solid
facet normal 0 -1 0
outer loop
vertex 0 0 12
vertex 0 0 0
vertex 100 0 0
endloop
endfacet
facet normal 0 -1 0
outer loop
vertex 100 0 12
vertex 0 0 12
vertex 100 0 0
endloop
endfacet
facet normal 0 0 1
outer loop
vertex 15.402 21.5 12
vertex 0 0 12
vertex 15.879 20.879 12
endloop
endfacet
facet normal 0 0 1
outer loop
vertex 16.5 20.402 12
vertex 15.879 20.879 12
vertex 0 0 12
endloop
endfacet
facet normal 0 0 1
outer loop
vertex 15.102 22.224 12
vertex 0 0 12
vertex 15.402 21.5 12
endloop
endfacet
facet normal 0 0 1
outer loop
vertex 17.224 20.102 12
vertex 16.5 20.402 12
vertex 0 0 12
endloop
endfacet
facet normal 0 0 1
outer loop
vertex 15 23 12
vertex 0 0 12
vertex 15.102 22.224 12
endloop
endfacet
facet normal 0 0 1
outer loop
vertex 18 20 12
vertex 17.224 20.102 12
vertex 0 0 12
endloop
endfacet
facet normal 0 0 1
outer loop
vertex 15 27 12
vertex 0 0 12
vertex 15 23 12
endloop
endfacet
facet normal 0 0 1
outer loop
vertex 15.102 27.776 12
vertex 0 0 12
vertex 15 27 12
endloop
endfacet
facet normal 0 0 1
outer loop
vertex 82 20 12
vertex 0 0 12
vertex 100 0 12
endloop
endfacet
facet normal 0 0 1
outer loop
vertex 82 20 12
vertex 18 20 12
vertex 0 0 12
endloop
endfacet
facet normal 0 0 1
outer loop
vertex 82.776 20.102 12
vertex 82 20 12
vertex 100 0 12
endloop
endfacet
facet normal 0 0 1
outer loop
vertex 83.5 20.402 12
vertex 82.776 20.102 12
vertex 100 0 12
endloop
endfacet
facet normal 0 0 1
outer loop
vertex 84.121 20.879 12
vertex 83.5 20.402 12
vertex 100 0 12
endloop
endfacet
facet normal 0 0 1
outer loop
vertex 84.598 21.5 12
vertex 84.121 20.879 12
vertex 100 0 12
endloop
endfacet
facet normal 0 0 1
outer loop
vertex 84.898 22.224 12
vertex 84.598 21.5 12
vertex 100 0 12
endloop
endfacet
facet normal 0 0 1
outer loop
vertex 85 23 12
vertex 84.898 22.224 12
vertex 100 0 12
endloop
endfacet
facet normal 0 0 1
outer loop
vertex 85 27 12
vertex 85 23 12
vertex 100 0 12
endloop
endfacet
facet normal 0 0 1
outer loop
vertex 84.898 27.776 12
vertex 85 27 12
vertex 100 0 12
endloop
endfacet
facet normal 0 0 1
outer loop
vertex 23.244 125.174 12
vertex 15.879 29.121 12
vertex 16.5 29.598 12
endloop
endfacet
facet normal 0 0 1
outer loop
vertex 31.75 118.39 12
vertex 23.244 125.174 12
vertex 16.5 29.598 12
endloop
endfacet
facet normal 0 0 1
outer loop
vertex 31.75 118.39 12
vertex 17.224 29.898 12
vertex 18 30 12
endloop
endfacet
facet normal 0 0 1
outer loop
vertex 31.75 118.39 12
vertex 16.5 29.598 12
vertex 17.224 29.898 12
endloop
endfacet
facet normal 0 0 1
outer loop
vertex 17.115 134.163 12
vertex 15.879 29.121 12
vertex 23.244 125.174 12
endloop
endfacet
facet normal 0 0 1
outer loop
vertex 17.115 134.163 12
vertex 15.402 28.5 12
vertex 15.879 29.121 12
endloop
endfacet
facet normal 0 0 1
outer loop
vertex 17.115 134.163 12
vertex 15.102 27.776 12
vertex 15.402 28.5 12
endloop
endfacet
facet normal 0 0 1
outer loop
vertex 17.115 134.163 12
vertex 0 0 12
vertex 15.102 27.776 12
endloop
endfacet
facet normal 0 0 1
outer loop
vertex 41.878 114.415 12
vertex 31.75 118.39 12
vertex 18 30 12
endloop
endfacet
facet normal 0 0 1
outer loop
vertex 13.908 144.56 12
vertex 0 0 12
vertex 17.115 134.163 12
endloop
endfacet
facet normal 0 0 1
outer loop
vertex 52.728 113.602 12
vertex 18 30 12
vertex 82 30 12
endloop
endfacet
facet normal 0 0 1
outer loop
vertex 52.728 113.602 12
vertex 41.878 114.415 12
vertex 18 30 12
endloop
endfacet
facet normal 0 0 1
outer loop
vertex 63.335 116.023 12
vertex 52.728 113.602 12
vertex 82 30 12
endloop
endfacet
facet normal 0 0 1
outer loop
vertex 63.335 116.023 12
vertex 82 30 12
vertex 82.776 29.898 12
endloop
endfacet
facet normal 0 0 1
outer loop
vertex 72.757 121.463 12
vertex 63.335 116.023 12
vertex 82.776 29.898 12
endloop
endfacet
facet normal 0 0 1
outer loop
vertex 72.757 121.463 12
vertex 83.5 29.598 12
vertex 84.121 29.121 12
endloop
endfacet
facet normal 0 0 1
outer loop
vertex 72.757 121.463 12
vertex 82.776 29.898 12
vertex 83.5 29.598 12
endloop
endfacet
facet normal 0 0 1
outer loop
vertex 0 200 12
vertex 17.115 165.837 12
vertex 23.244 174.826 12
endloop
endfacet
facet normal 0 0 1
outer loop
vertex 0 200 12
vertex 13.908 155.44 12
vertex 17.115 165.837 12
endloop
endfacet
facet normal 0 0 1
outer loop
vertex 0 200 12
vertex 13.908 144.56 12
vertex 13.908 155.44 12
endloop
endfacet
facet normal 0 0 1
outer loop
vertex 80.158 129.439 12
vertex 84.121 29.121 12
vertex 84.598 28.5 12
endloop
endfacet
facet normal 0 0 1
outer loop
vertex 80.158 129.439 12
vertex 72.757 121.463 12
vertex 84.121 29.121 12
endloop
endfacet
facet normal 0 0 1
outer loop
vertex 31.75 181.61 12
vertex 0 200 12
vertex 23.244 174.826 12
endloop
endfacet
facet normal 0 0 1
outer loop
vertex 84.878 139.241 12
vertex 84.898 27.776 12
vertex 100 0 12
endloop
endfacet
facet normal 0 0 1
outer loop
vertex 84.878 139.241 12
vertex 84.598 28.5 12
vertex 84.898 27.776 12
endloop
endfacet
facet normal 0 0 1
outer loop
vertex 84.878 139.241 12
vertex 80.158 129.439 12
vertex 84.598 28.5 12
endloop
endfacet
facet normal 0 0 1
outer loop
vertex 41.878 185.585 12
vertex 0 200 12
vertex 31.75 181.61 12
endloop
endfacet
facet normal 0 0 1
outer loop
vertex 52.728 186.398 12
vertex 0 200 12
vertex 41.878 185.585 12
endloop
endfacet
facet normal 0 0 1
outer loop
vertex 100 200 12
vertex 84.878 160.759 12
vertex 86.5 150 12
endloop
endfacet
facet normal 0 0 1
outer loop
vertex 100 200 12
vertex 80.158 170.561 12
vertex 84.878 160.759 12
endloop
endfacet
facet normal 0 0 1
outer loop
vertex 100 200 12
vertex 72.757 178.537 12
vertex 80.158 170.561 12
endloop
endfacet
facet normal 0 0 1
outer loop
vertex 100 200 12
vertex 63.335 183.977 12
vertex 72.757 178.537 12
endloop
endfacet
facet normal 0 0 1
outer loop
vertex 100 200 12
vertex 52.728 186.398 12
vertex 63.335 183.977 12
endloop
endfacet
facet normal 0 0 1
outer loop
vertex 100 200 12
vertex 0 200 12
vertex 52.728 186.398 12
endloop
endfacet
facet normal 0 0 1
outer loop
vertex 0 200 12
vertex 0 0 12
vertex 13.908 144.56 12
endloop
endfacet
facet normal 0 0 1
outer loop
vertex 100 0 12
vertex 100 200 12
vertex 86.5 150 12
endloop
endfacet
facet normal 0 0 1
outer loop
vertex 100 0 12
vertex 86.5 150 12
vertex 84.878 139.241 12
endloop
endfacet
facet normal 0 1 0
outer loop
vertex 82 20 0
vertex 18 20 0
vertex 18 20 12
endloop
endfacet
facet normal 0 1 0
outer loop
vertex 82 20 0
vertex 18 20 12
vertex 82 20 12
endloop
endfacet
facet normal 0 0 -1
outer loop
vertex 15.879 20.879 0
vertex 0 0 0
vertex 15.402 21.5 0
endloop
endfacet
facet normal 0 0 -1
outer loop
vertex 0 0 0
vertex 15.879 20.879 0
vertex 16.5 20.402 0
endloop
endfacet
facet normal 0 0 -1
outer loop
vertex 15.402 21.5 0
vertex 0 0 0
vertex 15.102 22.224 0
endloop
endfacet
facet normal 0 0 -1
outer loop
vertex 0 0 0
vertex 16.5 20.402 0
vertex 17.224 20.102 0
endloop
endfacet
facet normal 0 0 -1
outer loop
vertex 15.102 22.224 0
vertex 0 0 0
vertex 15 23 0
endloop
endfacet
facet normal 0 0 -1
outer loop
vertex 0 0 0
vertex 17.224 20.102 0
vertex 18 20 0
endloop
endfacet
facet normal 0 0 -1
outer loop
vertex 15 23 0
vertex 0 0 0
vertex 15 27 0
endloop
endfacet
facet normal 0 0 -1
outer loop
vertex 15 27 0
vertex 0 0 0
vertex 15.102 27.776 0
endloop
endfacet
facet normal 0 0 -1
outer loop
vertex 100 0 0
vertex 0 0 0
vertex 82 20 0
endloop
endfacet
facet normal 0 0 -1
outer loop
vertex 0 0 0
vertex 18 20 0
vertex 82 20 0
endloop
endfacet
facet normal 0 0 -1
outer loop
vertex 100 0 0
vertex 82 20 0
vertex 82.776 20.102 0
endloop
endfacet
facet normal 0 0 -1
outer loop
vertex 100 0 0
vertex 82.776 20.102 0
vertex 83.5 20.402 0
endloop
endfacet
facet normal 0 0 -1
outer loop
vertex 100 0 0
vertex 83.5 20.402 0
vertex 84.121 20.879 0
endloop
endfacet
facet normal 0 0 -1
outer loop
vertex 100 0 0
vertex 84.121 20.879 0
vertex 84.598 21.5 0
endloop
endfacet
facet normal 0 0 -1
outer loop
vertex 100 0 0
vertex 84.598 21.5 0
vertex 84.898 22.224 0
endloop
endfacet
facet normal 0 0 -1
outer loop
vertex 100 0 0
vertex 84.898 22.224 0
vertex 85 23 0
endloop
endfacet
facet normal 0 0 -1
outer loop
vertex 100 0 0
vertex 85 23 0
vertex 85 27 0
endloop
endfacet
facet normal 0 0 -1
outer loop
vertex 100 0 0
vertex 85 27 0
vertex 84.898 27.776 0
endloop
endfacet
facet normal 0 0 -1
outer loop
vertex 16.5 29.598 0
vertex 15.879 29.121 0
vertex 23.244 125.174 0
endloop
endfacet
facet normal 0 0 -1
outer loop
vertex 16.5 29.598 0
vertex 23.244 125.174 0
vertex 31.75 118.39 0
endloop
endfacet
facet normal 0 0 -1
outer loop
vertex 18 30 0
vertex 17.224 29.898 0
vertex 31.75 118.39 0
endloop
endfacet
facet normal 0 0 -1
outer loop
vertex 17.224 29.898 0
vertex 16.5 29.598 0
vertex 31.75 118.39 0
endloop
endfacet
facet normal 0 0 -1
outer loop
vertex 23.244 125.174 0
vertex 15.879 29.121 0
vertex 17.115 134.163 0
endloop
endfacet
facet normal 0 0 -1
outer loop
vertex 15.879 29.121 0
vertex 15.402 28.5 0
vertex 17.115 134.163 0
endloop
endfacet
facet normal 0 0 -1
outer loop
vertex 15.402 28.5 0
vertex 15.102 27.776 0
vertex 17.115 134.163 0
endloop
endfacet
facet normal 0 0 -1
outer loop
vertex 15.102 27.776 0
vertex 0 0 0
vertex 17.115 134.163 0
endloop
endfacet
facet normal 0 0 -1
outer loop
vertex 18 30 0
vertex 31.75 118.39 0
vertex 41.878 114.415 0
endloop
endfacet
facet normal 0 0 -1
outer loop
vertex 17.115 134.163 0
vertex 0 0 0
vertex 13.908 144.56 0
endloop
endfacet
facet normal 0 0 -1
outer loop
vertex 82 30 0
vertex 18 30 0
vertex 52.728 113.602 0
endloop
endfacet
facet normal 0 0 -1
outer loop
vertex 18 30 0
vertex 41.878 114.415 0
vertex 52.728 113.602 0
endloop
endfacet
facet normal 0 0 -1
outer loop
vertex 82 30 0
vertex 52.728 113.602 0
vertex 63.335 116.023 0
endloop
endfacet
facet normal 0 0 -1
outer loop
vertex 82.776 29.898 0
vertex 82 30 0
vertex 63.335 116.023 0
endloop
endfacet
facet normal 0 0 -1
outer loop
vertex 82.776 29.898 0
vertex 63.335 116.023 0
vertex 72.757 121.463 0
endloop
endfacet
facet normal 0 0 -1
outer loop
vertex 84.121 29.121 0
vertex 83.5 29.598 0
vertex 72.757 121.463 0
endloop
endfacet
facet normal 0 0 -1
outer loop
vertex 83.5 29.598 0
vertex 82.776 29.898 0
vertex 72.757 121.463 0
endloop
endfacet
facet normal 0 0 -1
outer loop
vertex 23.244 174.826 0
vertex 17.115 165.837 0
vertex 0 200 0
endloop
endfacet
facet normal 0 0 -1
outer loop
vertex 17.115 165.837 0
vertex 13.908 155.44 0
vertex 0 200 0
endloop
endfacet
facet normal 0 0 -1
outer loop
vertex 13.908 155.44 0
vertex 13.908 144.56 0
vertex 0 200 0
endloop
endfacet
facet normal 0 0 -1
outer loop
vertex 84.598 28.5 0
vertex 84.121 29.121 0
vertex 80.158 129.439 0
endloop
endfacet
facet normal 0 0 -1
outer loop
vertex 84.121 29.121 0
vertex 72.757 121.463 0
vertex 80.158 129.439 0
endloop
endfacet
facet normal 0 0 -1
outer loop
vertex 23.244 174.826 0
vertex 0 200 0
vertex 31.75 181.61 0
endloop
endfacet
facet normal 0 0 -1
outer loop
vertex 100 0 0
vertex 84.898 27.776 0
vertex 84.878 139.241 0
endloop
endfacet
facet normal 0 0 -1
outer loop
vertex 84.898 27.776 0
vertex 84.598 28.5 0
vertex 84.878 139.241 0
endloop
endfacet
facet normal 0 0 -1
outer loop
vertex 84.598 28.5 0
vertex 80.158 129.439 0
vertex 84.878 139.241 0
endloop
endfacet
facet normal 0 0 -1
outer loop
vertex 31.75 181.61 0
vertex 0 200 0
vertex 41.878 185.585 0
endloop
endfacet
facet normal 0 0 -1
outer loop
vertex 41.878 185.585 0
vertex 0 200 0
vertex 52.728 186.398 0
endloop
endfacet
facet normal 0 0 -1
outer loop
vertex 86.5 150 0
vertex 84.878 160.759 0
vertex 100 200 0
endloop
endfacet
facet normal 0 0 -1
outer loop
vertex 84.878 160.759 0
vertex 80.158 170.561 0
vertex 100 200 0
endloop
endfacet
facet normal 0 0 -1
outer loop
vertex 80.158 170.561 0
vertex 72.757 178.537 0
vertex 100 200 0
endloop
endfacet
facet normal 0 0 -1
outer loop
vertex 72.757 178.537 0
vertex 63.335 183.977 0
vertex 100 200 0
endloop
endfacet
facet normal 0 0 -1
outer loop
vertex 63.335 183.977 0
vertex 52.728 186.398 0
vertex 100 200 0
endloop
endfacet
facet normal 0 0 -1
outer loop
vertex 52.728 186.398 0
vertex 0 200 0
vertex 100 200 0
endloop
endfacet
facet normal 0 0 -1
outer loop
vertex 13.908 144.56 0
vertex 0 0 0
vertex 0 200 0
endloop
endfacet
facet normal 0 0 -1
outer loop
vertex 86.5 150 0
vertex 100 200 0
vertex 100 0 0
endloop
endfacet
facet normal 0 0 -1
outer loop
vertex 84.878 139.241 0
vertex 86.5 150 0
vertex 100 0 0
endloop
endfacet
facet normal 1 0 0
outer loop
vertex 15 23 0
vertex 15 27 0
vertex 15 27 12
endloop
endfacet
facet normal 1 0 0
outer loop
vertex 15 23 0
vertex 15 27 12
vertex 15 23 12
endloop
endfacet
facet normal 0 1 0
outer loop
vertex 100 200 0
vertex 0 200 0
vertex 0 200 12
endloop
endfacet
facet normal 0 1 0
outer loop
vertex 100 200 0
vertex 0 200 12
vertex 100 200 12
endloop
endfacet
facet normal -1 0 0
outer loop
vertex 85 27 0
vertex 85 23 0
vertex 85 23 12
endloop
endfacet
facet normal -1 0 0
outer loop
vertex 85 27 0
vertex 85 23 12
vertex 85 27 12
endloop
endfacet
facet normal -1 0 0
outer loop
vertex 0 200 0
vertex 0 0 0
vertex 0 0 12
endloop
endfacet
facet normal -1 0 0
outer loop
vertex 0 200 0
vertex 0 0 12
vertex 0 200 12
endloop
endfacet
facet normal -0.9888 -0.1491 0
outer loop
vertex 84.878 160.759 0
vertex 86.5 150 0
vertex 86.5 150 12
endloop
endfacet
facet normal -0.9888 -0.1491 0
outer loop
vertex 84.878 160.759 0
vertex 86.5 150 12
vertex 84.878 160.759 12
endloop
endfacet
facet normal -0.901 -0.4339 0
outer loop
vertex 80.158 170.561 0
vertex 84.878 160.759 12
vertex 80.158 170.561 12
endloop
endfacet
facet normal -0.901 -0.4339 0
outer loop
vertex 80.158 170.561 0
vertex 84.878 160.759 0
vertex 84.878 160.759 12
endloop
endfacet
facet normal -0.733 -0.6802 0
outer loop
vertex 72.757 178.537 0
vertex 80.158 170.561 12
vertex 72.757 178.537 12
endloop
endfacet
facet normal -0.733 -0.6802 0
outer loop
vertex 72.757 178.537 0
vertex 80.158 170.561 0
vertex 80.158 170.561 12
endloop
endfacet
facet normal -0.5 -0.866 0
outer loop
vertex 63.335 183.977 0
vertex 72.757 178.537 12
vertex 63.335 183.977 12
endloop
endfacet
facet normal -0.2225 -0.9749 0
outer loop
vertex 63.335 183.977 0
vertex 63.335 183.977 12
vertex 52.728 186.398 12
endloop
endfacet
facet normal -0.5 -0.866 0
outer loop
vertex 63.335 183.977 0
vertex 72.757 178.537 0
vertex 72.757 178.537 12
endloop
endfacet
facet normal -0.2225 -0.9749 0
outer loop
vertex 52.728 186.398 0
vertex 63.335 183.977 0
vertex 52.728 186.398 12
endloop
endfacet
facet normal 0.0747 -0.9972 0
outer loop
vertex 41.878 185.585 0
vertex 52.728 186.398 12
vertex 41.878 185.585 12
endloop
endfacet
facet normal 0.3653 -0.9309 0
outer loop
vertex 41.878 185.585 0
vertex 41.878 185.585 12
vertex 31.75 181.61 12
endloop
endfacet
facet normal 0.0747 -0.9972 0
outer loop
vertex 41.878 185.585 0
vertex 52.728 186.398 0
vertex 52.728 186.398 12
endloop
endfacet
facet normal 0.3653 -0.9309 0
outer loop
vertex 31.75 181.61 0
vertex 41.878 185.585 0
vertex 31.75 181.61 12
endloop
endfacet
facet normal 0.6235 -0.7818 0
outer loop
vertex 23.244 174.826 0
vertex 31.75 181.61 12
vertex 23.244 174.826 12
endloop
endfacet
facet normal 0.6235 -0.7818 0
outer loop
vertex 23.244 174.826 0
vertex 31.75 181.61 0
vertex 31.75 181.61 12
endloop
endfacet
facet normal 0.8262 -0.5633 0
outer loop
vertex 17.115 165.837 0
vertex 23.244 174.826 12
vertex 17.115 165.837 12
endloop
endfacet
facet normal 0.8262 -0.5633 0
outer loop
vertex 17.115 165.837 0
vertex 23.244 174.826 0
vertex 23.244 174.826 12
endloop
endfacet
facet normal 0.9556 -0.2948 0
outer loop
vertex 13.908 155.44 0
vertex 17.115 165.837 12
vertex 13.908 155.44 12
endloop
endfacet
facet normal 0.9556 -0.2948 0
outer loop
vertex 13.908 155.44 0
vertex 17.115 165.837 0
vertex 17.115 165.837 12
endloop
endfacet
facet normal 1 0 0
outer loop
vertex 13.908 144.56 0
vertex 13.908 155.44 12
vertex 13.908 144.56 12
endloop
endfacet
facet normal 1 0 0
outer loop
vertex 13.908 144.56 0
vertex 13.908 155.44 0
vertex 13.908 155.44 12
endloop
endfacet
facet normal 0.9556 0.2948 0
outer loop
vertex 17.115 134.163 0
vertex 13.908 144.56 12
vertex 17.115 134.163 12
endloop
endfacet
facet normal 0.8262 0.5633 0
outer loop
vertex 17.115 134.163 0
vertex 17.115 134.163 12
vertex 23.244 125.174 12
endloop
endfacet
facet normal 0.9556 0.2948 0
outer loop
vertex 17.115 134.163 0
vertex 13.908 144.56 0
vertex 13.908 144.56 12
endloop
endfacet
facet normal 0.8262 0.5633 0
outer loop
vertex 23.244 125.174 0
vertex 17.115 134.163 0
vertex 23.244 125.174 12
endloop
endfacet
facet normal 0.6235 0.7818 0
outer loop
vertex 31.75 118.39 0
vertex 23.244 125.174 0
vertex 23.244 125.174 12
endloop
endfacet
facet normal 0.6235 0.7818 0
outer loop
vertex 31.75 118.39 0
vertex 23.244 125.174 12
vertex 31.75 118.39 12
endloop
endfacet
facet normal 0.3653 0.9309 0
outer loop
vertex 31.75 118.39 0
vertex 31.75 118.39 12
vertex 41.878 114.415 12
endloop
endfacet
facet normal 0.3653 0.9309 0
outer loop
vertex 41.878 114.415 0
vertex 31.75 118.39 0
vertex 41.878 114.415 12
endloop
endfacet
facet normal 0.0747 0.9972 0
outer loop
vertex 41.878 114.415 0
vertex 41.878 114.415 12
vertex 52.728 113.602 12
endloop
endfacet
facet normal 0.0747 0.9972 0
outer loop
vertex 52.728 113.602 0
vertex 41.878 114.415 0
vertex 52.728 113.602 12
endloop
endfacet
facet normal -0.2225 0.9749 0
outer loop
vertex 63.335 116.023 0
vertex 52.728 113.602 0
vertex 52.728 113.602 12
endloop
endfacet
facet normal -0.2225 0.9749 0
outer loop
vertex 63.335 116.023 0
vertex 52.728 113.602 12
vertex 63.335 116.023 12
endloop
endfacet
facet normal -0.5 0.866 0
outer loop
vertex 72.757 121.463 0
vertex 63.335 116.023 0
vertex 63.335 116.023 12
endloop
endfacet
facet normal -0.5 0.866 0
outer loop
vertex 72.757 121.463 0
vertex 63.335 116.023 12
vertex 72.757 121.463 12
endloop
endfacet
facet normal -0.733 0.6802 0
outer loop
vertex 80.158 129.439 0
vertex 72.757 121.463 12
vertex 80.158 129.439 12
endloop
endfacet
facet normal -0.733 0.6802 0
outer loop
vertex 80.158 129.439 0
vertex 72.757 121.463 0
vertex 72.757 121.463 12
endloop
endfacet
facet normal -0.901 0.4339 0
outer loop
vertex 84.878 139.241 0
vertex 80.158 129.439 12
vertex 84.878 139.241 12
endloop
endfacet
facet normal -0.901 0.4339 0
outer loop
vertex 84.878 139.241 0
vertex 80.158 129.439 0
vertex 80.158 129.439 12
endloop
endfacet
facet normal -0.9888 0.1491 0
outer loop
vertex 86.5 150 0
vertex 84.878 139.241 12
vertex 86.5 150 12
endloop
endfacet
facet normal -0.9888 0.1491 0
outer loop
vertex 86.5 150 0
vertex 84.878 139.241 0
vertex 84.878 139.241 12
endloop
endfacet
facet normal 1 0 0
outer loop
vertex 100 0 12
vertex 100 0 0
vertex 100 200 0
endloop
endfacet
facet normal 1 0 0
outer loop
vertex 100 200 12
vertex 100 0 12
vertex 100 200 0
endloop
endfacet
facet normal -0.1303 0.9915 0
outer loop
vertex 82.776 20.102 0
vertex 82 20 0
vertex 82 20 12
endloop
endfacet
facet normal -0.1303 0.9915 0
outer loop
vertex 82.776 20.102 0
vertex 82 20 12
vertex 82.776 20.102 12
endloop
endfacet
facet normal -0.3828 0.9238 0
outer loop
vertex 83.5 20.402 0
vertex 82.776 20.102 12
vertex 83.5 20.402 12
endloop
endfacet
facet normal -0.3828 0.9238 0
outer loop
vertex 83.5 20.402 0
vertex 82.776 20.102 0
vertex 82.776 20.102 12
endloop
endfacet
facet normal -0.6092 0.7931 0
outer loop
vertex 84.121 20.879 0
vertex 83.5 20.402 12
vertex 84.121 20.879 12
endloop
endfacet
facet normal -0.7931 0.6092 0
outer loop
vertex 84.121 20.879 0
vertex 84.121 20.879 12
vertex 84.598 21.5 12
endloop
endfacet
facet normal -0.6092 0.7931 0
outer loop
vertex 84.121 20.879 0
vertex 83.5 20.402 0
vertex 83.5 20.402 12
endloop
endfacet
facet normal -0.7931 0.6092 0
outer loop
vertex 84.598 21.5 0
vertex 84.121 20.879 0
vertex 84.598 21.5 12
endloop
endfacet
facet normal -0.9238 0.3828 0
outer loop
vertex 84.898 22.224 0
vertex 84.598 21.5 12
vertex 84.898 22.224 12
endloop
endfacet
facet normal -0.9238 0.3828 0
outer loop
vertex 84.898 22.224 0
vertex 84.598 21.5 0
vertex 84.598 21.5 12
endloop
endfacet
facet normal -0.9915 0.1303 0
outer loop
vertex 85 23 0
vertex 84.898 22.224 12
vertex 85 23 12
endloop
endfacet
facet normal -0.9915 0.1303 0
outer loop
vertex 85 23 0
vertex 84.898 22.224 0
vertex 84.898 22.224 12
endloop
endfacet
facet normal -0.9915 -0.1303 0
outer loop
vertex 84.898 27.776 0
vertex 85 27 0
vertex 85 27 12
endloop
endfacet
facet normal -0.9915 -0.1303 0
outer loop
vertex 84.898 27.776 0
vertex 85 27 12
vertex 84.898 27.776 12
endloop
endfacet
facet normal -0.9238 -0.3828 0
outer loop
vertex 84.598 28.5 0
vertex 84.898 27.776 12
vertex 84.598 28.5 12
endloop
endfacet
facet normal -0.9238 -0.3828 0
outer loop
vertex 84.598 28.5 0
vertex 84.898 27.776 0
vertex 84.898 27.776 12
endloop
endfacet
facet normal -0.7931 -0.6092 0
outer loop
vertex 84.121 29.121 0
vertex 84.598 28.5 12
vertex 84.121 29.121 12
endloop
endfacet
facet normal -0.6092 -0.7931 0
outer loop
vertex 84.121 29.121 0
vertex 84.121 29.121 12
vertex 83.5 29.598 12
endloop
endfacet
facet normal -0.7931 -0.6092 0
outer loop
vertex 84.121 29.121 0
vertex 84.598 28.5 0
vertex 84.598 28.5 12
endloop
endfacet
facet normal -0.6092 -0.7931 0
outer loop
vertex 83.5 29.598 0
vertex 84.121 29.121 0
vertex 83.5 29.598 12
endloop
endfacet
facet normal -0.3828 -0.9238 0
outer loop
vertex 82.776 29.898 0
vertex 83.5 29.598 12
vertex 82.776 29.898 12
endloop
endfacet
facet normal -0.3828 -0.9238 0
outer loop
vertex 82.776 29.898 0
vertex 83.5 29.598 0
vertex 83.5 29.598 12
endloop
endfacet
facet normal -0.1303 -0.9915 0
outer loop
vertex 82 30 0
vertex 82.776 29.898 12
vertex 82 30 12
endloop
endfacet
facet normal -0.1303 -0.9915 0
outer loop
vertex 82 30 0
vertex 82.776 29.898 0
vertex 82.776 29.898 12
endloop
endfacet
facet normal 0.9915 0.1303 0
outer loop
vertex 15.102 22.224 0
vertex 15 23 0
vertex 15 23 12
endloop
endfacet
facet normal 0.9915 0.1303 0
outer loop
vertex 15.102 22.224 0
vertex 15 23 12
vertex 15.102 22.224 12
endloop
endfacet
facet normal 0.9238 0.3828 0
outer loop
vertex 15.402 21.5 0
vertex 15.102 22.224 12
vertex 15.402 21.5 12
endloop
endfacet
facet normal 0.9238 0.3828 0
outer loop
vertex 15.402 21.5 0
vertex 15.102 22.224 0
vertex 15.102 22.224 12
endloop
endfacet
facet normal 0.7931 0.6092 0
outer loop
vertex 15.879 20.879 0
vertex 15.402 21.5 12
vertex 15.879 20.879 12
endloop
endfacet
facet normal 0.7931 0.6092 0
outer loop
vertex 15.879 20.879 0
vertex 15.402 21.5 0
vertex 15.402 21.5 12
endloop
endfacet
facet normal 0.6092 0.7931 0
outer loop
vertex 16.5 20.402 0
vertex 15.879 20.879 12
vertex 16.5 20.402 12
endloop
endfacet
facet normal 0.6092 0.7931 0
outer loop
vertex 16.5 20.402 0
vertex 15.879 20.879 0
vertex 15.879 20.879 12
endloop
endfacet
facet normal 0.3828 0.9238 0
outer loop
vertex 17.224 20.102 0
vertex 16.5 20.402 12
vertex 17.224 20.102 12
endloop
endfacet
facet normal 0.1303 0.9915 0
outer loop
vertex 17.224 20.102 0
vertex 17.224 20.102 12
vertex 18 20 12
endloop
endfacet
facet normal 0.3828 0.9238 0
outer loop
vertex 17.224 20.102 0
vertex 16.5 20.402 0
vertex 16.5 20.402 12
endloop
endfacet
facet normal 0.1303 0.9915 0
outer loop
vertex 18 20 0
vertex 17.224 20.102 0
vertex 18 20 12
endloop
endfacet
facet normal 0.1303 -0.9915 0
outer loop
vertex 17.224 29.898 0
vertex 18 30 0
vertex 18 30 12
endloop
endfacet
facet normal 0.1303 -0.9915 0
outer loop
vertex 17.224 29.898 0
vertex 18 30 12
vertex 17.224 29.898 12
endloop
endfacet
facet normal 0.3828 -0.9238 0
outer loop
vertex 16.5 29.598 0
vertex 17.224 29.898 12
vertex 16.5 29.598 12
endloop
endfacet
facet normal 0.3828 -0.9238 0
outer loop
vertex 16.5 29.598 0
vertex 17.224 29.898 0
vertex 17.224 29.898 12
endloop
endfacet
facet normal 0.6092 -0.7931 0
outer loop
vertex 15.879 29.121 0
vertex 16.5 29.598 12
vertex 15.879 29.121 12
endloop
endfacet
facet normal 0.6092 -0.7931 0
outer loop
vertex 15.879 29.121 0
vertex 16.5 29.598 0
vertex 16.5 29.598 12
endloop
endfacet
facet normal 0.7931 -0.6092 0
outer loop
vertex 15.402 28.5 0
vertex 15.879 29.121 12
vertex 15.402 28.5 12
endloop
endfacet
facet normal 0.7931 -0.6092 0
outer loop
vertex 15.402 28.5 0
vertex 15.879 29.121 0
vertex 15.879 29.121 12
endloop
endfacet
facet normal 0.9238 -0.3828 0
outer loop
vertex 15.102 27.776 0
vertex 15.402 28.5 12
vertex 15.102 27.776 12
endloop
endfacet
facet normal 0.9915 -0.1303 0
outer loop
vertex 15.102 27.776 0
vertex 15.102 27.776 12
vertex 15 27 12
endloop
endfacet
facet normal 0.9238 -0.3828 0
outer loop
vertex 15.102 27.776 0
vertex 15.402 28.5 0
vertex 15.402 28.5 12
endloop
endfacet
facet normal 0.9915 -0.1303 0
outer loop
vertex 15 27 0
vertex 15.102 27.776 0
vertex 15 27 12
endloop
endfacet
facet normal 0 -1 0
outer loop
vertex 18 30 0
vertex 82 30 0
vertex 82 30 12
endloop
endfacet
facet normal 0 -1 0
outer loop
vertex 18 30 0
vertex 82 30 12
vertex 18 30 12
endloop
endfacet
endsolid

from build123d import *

# Parameters (mm, degrees)
SKETCH_W  = 100
SKETCH_H  = 200
SKETCH_R  = 36.5
PAD_DEPTH = 12


with BuildPart() as part:
    # Sketch → Pad (new body)
    with BuildSketch(Plane.XY):
        with Locations((50, 100)):
            Rectangle(SKETCH_W, SKETCH_H)
        with Locations((50, 150)):
            Circle(SKETCH_R, mode=Mode.SUBTRACT)
        with BuildLine():
            Line((18, 20), (82, 20))
            ThreePointArc((82, 20), (84.12132, 20.87868), (85, 23))
            Line((85, 23), (85, 27))
            ThreePointArc((85, 27), (84.12132, 29.12132), (82, 30))
            Line((82, 30), (18, 30))
            ThreePointArc((18, 30), (15.87868, 29.12132), (15, 27))
            Line((15, 27), (15, 23))
            ThreePointArc((15, 23), (15.87868, 20.87868), (18, 20))
        make_face(mode=Mode.SUBTRACT)
    extrude(amount=PAD_DEPTH)


solid = part.part
